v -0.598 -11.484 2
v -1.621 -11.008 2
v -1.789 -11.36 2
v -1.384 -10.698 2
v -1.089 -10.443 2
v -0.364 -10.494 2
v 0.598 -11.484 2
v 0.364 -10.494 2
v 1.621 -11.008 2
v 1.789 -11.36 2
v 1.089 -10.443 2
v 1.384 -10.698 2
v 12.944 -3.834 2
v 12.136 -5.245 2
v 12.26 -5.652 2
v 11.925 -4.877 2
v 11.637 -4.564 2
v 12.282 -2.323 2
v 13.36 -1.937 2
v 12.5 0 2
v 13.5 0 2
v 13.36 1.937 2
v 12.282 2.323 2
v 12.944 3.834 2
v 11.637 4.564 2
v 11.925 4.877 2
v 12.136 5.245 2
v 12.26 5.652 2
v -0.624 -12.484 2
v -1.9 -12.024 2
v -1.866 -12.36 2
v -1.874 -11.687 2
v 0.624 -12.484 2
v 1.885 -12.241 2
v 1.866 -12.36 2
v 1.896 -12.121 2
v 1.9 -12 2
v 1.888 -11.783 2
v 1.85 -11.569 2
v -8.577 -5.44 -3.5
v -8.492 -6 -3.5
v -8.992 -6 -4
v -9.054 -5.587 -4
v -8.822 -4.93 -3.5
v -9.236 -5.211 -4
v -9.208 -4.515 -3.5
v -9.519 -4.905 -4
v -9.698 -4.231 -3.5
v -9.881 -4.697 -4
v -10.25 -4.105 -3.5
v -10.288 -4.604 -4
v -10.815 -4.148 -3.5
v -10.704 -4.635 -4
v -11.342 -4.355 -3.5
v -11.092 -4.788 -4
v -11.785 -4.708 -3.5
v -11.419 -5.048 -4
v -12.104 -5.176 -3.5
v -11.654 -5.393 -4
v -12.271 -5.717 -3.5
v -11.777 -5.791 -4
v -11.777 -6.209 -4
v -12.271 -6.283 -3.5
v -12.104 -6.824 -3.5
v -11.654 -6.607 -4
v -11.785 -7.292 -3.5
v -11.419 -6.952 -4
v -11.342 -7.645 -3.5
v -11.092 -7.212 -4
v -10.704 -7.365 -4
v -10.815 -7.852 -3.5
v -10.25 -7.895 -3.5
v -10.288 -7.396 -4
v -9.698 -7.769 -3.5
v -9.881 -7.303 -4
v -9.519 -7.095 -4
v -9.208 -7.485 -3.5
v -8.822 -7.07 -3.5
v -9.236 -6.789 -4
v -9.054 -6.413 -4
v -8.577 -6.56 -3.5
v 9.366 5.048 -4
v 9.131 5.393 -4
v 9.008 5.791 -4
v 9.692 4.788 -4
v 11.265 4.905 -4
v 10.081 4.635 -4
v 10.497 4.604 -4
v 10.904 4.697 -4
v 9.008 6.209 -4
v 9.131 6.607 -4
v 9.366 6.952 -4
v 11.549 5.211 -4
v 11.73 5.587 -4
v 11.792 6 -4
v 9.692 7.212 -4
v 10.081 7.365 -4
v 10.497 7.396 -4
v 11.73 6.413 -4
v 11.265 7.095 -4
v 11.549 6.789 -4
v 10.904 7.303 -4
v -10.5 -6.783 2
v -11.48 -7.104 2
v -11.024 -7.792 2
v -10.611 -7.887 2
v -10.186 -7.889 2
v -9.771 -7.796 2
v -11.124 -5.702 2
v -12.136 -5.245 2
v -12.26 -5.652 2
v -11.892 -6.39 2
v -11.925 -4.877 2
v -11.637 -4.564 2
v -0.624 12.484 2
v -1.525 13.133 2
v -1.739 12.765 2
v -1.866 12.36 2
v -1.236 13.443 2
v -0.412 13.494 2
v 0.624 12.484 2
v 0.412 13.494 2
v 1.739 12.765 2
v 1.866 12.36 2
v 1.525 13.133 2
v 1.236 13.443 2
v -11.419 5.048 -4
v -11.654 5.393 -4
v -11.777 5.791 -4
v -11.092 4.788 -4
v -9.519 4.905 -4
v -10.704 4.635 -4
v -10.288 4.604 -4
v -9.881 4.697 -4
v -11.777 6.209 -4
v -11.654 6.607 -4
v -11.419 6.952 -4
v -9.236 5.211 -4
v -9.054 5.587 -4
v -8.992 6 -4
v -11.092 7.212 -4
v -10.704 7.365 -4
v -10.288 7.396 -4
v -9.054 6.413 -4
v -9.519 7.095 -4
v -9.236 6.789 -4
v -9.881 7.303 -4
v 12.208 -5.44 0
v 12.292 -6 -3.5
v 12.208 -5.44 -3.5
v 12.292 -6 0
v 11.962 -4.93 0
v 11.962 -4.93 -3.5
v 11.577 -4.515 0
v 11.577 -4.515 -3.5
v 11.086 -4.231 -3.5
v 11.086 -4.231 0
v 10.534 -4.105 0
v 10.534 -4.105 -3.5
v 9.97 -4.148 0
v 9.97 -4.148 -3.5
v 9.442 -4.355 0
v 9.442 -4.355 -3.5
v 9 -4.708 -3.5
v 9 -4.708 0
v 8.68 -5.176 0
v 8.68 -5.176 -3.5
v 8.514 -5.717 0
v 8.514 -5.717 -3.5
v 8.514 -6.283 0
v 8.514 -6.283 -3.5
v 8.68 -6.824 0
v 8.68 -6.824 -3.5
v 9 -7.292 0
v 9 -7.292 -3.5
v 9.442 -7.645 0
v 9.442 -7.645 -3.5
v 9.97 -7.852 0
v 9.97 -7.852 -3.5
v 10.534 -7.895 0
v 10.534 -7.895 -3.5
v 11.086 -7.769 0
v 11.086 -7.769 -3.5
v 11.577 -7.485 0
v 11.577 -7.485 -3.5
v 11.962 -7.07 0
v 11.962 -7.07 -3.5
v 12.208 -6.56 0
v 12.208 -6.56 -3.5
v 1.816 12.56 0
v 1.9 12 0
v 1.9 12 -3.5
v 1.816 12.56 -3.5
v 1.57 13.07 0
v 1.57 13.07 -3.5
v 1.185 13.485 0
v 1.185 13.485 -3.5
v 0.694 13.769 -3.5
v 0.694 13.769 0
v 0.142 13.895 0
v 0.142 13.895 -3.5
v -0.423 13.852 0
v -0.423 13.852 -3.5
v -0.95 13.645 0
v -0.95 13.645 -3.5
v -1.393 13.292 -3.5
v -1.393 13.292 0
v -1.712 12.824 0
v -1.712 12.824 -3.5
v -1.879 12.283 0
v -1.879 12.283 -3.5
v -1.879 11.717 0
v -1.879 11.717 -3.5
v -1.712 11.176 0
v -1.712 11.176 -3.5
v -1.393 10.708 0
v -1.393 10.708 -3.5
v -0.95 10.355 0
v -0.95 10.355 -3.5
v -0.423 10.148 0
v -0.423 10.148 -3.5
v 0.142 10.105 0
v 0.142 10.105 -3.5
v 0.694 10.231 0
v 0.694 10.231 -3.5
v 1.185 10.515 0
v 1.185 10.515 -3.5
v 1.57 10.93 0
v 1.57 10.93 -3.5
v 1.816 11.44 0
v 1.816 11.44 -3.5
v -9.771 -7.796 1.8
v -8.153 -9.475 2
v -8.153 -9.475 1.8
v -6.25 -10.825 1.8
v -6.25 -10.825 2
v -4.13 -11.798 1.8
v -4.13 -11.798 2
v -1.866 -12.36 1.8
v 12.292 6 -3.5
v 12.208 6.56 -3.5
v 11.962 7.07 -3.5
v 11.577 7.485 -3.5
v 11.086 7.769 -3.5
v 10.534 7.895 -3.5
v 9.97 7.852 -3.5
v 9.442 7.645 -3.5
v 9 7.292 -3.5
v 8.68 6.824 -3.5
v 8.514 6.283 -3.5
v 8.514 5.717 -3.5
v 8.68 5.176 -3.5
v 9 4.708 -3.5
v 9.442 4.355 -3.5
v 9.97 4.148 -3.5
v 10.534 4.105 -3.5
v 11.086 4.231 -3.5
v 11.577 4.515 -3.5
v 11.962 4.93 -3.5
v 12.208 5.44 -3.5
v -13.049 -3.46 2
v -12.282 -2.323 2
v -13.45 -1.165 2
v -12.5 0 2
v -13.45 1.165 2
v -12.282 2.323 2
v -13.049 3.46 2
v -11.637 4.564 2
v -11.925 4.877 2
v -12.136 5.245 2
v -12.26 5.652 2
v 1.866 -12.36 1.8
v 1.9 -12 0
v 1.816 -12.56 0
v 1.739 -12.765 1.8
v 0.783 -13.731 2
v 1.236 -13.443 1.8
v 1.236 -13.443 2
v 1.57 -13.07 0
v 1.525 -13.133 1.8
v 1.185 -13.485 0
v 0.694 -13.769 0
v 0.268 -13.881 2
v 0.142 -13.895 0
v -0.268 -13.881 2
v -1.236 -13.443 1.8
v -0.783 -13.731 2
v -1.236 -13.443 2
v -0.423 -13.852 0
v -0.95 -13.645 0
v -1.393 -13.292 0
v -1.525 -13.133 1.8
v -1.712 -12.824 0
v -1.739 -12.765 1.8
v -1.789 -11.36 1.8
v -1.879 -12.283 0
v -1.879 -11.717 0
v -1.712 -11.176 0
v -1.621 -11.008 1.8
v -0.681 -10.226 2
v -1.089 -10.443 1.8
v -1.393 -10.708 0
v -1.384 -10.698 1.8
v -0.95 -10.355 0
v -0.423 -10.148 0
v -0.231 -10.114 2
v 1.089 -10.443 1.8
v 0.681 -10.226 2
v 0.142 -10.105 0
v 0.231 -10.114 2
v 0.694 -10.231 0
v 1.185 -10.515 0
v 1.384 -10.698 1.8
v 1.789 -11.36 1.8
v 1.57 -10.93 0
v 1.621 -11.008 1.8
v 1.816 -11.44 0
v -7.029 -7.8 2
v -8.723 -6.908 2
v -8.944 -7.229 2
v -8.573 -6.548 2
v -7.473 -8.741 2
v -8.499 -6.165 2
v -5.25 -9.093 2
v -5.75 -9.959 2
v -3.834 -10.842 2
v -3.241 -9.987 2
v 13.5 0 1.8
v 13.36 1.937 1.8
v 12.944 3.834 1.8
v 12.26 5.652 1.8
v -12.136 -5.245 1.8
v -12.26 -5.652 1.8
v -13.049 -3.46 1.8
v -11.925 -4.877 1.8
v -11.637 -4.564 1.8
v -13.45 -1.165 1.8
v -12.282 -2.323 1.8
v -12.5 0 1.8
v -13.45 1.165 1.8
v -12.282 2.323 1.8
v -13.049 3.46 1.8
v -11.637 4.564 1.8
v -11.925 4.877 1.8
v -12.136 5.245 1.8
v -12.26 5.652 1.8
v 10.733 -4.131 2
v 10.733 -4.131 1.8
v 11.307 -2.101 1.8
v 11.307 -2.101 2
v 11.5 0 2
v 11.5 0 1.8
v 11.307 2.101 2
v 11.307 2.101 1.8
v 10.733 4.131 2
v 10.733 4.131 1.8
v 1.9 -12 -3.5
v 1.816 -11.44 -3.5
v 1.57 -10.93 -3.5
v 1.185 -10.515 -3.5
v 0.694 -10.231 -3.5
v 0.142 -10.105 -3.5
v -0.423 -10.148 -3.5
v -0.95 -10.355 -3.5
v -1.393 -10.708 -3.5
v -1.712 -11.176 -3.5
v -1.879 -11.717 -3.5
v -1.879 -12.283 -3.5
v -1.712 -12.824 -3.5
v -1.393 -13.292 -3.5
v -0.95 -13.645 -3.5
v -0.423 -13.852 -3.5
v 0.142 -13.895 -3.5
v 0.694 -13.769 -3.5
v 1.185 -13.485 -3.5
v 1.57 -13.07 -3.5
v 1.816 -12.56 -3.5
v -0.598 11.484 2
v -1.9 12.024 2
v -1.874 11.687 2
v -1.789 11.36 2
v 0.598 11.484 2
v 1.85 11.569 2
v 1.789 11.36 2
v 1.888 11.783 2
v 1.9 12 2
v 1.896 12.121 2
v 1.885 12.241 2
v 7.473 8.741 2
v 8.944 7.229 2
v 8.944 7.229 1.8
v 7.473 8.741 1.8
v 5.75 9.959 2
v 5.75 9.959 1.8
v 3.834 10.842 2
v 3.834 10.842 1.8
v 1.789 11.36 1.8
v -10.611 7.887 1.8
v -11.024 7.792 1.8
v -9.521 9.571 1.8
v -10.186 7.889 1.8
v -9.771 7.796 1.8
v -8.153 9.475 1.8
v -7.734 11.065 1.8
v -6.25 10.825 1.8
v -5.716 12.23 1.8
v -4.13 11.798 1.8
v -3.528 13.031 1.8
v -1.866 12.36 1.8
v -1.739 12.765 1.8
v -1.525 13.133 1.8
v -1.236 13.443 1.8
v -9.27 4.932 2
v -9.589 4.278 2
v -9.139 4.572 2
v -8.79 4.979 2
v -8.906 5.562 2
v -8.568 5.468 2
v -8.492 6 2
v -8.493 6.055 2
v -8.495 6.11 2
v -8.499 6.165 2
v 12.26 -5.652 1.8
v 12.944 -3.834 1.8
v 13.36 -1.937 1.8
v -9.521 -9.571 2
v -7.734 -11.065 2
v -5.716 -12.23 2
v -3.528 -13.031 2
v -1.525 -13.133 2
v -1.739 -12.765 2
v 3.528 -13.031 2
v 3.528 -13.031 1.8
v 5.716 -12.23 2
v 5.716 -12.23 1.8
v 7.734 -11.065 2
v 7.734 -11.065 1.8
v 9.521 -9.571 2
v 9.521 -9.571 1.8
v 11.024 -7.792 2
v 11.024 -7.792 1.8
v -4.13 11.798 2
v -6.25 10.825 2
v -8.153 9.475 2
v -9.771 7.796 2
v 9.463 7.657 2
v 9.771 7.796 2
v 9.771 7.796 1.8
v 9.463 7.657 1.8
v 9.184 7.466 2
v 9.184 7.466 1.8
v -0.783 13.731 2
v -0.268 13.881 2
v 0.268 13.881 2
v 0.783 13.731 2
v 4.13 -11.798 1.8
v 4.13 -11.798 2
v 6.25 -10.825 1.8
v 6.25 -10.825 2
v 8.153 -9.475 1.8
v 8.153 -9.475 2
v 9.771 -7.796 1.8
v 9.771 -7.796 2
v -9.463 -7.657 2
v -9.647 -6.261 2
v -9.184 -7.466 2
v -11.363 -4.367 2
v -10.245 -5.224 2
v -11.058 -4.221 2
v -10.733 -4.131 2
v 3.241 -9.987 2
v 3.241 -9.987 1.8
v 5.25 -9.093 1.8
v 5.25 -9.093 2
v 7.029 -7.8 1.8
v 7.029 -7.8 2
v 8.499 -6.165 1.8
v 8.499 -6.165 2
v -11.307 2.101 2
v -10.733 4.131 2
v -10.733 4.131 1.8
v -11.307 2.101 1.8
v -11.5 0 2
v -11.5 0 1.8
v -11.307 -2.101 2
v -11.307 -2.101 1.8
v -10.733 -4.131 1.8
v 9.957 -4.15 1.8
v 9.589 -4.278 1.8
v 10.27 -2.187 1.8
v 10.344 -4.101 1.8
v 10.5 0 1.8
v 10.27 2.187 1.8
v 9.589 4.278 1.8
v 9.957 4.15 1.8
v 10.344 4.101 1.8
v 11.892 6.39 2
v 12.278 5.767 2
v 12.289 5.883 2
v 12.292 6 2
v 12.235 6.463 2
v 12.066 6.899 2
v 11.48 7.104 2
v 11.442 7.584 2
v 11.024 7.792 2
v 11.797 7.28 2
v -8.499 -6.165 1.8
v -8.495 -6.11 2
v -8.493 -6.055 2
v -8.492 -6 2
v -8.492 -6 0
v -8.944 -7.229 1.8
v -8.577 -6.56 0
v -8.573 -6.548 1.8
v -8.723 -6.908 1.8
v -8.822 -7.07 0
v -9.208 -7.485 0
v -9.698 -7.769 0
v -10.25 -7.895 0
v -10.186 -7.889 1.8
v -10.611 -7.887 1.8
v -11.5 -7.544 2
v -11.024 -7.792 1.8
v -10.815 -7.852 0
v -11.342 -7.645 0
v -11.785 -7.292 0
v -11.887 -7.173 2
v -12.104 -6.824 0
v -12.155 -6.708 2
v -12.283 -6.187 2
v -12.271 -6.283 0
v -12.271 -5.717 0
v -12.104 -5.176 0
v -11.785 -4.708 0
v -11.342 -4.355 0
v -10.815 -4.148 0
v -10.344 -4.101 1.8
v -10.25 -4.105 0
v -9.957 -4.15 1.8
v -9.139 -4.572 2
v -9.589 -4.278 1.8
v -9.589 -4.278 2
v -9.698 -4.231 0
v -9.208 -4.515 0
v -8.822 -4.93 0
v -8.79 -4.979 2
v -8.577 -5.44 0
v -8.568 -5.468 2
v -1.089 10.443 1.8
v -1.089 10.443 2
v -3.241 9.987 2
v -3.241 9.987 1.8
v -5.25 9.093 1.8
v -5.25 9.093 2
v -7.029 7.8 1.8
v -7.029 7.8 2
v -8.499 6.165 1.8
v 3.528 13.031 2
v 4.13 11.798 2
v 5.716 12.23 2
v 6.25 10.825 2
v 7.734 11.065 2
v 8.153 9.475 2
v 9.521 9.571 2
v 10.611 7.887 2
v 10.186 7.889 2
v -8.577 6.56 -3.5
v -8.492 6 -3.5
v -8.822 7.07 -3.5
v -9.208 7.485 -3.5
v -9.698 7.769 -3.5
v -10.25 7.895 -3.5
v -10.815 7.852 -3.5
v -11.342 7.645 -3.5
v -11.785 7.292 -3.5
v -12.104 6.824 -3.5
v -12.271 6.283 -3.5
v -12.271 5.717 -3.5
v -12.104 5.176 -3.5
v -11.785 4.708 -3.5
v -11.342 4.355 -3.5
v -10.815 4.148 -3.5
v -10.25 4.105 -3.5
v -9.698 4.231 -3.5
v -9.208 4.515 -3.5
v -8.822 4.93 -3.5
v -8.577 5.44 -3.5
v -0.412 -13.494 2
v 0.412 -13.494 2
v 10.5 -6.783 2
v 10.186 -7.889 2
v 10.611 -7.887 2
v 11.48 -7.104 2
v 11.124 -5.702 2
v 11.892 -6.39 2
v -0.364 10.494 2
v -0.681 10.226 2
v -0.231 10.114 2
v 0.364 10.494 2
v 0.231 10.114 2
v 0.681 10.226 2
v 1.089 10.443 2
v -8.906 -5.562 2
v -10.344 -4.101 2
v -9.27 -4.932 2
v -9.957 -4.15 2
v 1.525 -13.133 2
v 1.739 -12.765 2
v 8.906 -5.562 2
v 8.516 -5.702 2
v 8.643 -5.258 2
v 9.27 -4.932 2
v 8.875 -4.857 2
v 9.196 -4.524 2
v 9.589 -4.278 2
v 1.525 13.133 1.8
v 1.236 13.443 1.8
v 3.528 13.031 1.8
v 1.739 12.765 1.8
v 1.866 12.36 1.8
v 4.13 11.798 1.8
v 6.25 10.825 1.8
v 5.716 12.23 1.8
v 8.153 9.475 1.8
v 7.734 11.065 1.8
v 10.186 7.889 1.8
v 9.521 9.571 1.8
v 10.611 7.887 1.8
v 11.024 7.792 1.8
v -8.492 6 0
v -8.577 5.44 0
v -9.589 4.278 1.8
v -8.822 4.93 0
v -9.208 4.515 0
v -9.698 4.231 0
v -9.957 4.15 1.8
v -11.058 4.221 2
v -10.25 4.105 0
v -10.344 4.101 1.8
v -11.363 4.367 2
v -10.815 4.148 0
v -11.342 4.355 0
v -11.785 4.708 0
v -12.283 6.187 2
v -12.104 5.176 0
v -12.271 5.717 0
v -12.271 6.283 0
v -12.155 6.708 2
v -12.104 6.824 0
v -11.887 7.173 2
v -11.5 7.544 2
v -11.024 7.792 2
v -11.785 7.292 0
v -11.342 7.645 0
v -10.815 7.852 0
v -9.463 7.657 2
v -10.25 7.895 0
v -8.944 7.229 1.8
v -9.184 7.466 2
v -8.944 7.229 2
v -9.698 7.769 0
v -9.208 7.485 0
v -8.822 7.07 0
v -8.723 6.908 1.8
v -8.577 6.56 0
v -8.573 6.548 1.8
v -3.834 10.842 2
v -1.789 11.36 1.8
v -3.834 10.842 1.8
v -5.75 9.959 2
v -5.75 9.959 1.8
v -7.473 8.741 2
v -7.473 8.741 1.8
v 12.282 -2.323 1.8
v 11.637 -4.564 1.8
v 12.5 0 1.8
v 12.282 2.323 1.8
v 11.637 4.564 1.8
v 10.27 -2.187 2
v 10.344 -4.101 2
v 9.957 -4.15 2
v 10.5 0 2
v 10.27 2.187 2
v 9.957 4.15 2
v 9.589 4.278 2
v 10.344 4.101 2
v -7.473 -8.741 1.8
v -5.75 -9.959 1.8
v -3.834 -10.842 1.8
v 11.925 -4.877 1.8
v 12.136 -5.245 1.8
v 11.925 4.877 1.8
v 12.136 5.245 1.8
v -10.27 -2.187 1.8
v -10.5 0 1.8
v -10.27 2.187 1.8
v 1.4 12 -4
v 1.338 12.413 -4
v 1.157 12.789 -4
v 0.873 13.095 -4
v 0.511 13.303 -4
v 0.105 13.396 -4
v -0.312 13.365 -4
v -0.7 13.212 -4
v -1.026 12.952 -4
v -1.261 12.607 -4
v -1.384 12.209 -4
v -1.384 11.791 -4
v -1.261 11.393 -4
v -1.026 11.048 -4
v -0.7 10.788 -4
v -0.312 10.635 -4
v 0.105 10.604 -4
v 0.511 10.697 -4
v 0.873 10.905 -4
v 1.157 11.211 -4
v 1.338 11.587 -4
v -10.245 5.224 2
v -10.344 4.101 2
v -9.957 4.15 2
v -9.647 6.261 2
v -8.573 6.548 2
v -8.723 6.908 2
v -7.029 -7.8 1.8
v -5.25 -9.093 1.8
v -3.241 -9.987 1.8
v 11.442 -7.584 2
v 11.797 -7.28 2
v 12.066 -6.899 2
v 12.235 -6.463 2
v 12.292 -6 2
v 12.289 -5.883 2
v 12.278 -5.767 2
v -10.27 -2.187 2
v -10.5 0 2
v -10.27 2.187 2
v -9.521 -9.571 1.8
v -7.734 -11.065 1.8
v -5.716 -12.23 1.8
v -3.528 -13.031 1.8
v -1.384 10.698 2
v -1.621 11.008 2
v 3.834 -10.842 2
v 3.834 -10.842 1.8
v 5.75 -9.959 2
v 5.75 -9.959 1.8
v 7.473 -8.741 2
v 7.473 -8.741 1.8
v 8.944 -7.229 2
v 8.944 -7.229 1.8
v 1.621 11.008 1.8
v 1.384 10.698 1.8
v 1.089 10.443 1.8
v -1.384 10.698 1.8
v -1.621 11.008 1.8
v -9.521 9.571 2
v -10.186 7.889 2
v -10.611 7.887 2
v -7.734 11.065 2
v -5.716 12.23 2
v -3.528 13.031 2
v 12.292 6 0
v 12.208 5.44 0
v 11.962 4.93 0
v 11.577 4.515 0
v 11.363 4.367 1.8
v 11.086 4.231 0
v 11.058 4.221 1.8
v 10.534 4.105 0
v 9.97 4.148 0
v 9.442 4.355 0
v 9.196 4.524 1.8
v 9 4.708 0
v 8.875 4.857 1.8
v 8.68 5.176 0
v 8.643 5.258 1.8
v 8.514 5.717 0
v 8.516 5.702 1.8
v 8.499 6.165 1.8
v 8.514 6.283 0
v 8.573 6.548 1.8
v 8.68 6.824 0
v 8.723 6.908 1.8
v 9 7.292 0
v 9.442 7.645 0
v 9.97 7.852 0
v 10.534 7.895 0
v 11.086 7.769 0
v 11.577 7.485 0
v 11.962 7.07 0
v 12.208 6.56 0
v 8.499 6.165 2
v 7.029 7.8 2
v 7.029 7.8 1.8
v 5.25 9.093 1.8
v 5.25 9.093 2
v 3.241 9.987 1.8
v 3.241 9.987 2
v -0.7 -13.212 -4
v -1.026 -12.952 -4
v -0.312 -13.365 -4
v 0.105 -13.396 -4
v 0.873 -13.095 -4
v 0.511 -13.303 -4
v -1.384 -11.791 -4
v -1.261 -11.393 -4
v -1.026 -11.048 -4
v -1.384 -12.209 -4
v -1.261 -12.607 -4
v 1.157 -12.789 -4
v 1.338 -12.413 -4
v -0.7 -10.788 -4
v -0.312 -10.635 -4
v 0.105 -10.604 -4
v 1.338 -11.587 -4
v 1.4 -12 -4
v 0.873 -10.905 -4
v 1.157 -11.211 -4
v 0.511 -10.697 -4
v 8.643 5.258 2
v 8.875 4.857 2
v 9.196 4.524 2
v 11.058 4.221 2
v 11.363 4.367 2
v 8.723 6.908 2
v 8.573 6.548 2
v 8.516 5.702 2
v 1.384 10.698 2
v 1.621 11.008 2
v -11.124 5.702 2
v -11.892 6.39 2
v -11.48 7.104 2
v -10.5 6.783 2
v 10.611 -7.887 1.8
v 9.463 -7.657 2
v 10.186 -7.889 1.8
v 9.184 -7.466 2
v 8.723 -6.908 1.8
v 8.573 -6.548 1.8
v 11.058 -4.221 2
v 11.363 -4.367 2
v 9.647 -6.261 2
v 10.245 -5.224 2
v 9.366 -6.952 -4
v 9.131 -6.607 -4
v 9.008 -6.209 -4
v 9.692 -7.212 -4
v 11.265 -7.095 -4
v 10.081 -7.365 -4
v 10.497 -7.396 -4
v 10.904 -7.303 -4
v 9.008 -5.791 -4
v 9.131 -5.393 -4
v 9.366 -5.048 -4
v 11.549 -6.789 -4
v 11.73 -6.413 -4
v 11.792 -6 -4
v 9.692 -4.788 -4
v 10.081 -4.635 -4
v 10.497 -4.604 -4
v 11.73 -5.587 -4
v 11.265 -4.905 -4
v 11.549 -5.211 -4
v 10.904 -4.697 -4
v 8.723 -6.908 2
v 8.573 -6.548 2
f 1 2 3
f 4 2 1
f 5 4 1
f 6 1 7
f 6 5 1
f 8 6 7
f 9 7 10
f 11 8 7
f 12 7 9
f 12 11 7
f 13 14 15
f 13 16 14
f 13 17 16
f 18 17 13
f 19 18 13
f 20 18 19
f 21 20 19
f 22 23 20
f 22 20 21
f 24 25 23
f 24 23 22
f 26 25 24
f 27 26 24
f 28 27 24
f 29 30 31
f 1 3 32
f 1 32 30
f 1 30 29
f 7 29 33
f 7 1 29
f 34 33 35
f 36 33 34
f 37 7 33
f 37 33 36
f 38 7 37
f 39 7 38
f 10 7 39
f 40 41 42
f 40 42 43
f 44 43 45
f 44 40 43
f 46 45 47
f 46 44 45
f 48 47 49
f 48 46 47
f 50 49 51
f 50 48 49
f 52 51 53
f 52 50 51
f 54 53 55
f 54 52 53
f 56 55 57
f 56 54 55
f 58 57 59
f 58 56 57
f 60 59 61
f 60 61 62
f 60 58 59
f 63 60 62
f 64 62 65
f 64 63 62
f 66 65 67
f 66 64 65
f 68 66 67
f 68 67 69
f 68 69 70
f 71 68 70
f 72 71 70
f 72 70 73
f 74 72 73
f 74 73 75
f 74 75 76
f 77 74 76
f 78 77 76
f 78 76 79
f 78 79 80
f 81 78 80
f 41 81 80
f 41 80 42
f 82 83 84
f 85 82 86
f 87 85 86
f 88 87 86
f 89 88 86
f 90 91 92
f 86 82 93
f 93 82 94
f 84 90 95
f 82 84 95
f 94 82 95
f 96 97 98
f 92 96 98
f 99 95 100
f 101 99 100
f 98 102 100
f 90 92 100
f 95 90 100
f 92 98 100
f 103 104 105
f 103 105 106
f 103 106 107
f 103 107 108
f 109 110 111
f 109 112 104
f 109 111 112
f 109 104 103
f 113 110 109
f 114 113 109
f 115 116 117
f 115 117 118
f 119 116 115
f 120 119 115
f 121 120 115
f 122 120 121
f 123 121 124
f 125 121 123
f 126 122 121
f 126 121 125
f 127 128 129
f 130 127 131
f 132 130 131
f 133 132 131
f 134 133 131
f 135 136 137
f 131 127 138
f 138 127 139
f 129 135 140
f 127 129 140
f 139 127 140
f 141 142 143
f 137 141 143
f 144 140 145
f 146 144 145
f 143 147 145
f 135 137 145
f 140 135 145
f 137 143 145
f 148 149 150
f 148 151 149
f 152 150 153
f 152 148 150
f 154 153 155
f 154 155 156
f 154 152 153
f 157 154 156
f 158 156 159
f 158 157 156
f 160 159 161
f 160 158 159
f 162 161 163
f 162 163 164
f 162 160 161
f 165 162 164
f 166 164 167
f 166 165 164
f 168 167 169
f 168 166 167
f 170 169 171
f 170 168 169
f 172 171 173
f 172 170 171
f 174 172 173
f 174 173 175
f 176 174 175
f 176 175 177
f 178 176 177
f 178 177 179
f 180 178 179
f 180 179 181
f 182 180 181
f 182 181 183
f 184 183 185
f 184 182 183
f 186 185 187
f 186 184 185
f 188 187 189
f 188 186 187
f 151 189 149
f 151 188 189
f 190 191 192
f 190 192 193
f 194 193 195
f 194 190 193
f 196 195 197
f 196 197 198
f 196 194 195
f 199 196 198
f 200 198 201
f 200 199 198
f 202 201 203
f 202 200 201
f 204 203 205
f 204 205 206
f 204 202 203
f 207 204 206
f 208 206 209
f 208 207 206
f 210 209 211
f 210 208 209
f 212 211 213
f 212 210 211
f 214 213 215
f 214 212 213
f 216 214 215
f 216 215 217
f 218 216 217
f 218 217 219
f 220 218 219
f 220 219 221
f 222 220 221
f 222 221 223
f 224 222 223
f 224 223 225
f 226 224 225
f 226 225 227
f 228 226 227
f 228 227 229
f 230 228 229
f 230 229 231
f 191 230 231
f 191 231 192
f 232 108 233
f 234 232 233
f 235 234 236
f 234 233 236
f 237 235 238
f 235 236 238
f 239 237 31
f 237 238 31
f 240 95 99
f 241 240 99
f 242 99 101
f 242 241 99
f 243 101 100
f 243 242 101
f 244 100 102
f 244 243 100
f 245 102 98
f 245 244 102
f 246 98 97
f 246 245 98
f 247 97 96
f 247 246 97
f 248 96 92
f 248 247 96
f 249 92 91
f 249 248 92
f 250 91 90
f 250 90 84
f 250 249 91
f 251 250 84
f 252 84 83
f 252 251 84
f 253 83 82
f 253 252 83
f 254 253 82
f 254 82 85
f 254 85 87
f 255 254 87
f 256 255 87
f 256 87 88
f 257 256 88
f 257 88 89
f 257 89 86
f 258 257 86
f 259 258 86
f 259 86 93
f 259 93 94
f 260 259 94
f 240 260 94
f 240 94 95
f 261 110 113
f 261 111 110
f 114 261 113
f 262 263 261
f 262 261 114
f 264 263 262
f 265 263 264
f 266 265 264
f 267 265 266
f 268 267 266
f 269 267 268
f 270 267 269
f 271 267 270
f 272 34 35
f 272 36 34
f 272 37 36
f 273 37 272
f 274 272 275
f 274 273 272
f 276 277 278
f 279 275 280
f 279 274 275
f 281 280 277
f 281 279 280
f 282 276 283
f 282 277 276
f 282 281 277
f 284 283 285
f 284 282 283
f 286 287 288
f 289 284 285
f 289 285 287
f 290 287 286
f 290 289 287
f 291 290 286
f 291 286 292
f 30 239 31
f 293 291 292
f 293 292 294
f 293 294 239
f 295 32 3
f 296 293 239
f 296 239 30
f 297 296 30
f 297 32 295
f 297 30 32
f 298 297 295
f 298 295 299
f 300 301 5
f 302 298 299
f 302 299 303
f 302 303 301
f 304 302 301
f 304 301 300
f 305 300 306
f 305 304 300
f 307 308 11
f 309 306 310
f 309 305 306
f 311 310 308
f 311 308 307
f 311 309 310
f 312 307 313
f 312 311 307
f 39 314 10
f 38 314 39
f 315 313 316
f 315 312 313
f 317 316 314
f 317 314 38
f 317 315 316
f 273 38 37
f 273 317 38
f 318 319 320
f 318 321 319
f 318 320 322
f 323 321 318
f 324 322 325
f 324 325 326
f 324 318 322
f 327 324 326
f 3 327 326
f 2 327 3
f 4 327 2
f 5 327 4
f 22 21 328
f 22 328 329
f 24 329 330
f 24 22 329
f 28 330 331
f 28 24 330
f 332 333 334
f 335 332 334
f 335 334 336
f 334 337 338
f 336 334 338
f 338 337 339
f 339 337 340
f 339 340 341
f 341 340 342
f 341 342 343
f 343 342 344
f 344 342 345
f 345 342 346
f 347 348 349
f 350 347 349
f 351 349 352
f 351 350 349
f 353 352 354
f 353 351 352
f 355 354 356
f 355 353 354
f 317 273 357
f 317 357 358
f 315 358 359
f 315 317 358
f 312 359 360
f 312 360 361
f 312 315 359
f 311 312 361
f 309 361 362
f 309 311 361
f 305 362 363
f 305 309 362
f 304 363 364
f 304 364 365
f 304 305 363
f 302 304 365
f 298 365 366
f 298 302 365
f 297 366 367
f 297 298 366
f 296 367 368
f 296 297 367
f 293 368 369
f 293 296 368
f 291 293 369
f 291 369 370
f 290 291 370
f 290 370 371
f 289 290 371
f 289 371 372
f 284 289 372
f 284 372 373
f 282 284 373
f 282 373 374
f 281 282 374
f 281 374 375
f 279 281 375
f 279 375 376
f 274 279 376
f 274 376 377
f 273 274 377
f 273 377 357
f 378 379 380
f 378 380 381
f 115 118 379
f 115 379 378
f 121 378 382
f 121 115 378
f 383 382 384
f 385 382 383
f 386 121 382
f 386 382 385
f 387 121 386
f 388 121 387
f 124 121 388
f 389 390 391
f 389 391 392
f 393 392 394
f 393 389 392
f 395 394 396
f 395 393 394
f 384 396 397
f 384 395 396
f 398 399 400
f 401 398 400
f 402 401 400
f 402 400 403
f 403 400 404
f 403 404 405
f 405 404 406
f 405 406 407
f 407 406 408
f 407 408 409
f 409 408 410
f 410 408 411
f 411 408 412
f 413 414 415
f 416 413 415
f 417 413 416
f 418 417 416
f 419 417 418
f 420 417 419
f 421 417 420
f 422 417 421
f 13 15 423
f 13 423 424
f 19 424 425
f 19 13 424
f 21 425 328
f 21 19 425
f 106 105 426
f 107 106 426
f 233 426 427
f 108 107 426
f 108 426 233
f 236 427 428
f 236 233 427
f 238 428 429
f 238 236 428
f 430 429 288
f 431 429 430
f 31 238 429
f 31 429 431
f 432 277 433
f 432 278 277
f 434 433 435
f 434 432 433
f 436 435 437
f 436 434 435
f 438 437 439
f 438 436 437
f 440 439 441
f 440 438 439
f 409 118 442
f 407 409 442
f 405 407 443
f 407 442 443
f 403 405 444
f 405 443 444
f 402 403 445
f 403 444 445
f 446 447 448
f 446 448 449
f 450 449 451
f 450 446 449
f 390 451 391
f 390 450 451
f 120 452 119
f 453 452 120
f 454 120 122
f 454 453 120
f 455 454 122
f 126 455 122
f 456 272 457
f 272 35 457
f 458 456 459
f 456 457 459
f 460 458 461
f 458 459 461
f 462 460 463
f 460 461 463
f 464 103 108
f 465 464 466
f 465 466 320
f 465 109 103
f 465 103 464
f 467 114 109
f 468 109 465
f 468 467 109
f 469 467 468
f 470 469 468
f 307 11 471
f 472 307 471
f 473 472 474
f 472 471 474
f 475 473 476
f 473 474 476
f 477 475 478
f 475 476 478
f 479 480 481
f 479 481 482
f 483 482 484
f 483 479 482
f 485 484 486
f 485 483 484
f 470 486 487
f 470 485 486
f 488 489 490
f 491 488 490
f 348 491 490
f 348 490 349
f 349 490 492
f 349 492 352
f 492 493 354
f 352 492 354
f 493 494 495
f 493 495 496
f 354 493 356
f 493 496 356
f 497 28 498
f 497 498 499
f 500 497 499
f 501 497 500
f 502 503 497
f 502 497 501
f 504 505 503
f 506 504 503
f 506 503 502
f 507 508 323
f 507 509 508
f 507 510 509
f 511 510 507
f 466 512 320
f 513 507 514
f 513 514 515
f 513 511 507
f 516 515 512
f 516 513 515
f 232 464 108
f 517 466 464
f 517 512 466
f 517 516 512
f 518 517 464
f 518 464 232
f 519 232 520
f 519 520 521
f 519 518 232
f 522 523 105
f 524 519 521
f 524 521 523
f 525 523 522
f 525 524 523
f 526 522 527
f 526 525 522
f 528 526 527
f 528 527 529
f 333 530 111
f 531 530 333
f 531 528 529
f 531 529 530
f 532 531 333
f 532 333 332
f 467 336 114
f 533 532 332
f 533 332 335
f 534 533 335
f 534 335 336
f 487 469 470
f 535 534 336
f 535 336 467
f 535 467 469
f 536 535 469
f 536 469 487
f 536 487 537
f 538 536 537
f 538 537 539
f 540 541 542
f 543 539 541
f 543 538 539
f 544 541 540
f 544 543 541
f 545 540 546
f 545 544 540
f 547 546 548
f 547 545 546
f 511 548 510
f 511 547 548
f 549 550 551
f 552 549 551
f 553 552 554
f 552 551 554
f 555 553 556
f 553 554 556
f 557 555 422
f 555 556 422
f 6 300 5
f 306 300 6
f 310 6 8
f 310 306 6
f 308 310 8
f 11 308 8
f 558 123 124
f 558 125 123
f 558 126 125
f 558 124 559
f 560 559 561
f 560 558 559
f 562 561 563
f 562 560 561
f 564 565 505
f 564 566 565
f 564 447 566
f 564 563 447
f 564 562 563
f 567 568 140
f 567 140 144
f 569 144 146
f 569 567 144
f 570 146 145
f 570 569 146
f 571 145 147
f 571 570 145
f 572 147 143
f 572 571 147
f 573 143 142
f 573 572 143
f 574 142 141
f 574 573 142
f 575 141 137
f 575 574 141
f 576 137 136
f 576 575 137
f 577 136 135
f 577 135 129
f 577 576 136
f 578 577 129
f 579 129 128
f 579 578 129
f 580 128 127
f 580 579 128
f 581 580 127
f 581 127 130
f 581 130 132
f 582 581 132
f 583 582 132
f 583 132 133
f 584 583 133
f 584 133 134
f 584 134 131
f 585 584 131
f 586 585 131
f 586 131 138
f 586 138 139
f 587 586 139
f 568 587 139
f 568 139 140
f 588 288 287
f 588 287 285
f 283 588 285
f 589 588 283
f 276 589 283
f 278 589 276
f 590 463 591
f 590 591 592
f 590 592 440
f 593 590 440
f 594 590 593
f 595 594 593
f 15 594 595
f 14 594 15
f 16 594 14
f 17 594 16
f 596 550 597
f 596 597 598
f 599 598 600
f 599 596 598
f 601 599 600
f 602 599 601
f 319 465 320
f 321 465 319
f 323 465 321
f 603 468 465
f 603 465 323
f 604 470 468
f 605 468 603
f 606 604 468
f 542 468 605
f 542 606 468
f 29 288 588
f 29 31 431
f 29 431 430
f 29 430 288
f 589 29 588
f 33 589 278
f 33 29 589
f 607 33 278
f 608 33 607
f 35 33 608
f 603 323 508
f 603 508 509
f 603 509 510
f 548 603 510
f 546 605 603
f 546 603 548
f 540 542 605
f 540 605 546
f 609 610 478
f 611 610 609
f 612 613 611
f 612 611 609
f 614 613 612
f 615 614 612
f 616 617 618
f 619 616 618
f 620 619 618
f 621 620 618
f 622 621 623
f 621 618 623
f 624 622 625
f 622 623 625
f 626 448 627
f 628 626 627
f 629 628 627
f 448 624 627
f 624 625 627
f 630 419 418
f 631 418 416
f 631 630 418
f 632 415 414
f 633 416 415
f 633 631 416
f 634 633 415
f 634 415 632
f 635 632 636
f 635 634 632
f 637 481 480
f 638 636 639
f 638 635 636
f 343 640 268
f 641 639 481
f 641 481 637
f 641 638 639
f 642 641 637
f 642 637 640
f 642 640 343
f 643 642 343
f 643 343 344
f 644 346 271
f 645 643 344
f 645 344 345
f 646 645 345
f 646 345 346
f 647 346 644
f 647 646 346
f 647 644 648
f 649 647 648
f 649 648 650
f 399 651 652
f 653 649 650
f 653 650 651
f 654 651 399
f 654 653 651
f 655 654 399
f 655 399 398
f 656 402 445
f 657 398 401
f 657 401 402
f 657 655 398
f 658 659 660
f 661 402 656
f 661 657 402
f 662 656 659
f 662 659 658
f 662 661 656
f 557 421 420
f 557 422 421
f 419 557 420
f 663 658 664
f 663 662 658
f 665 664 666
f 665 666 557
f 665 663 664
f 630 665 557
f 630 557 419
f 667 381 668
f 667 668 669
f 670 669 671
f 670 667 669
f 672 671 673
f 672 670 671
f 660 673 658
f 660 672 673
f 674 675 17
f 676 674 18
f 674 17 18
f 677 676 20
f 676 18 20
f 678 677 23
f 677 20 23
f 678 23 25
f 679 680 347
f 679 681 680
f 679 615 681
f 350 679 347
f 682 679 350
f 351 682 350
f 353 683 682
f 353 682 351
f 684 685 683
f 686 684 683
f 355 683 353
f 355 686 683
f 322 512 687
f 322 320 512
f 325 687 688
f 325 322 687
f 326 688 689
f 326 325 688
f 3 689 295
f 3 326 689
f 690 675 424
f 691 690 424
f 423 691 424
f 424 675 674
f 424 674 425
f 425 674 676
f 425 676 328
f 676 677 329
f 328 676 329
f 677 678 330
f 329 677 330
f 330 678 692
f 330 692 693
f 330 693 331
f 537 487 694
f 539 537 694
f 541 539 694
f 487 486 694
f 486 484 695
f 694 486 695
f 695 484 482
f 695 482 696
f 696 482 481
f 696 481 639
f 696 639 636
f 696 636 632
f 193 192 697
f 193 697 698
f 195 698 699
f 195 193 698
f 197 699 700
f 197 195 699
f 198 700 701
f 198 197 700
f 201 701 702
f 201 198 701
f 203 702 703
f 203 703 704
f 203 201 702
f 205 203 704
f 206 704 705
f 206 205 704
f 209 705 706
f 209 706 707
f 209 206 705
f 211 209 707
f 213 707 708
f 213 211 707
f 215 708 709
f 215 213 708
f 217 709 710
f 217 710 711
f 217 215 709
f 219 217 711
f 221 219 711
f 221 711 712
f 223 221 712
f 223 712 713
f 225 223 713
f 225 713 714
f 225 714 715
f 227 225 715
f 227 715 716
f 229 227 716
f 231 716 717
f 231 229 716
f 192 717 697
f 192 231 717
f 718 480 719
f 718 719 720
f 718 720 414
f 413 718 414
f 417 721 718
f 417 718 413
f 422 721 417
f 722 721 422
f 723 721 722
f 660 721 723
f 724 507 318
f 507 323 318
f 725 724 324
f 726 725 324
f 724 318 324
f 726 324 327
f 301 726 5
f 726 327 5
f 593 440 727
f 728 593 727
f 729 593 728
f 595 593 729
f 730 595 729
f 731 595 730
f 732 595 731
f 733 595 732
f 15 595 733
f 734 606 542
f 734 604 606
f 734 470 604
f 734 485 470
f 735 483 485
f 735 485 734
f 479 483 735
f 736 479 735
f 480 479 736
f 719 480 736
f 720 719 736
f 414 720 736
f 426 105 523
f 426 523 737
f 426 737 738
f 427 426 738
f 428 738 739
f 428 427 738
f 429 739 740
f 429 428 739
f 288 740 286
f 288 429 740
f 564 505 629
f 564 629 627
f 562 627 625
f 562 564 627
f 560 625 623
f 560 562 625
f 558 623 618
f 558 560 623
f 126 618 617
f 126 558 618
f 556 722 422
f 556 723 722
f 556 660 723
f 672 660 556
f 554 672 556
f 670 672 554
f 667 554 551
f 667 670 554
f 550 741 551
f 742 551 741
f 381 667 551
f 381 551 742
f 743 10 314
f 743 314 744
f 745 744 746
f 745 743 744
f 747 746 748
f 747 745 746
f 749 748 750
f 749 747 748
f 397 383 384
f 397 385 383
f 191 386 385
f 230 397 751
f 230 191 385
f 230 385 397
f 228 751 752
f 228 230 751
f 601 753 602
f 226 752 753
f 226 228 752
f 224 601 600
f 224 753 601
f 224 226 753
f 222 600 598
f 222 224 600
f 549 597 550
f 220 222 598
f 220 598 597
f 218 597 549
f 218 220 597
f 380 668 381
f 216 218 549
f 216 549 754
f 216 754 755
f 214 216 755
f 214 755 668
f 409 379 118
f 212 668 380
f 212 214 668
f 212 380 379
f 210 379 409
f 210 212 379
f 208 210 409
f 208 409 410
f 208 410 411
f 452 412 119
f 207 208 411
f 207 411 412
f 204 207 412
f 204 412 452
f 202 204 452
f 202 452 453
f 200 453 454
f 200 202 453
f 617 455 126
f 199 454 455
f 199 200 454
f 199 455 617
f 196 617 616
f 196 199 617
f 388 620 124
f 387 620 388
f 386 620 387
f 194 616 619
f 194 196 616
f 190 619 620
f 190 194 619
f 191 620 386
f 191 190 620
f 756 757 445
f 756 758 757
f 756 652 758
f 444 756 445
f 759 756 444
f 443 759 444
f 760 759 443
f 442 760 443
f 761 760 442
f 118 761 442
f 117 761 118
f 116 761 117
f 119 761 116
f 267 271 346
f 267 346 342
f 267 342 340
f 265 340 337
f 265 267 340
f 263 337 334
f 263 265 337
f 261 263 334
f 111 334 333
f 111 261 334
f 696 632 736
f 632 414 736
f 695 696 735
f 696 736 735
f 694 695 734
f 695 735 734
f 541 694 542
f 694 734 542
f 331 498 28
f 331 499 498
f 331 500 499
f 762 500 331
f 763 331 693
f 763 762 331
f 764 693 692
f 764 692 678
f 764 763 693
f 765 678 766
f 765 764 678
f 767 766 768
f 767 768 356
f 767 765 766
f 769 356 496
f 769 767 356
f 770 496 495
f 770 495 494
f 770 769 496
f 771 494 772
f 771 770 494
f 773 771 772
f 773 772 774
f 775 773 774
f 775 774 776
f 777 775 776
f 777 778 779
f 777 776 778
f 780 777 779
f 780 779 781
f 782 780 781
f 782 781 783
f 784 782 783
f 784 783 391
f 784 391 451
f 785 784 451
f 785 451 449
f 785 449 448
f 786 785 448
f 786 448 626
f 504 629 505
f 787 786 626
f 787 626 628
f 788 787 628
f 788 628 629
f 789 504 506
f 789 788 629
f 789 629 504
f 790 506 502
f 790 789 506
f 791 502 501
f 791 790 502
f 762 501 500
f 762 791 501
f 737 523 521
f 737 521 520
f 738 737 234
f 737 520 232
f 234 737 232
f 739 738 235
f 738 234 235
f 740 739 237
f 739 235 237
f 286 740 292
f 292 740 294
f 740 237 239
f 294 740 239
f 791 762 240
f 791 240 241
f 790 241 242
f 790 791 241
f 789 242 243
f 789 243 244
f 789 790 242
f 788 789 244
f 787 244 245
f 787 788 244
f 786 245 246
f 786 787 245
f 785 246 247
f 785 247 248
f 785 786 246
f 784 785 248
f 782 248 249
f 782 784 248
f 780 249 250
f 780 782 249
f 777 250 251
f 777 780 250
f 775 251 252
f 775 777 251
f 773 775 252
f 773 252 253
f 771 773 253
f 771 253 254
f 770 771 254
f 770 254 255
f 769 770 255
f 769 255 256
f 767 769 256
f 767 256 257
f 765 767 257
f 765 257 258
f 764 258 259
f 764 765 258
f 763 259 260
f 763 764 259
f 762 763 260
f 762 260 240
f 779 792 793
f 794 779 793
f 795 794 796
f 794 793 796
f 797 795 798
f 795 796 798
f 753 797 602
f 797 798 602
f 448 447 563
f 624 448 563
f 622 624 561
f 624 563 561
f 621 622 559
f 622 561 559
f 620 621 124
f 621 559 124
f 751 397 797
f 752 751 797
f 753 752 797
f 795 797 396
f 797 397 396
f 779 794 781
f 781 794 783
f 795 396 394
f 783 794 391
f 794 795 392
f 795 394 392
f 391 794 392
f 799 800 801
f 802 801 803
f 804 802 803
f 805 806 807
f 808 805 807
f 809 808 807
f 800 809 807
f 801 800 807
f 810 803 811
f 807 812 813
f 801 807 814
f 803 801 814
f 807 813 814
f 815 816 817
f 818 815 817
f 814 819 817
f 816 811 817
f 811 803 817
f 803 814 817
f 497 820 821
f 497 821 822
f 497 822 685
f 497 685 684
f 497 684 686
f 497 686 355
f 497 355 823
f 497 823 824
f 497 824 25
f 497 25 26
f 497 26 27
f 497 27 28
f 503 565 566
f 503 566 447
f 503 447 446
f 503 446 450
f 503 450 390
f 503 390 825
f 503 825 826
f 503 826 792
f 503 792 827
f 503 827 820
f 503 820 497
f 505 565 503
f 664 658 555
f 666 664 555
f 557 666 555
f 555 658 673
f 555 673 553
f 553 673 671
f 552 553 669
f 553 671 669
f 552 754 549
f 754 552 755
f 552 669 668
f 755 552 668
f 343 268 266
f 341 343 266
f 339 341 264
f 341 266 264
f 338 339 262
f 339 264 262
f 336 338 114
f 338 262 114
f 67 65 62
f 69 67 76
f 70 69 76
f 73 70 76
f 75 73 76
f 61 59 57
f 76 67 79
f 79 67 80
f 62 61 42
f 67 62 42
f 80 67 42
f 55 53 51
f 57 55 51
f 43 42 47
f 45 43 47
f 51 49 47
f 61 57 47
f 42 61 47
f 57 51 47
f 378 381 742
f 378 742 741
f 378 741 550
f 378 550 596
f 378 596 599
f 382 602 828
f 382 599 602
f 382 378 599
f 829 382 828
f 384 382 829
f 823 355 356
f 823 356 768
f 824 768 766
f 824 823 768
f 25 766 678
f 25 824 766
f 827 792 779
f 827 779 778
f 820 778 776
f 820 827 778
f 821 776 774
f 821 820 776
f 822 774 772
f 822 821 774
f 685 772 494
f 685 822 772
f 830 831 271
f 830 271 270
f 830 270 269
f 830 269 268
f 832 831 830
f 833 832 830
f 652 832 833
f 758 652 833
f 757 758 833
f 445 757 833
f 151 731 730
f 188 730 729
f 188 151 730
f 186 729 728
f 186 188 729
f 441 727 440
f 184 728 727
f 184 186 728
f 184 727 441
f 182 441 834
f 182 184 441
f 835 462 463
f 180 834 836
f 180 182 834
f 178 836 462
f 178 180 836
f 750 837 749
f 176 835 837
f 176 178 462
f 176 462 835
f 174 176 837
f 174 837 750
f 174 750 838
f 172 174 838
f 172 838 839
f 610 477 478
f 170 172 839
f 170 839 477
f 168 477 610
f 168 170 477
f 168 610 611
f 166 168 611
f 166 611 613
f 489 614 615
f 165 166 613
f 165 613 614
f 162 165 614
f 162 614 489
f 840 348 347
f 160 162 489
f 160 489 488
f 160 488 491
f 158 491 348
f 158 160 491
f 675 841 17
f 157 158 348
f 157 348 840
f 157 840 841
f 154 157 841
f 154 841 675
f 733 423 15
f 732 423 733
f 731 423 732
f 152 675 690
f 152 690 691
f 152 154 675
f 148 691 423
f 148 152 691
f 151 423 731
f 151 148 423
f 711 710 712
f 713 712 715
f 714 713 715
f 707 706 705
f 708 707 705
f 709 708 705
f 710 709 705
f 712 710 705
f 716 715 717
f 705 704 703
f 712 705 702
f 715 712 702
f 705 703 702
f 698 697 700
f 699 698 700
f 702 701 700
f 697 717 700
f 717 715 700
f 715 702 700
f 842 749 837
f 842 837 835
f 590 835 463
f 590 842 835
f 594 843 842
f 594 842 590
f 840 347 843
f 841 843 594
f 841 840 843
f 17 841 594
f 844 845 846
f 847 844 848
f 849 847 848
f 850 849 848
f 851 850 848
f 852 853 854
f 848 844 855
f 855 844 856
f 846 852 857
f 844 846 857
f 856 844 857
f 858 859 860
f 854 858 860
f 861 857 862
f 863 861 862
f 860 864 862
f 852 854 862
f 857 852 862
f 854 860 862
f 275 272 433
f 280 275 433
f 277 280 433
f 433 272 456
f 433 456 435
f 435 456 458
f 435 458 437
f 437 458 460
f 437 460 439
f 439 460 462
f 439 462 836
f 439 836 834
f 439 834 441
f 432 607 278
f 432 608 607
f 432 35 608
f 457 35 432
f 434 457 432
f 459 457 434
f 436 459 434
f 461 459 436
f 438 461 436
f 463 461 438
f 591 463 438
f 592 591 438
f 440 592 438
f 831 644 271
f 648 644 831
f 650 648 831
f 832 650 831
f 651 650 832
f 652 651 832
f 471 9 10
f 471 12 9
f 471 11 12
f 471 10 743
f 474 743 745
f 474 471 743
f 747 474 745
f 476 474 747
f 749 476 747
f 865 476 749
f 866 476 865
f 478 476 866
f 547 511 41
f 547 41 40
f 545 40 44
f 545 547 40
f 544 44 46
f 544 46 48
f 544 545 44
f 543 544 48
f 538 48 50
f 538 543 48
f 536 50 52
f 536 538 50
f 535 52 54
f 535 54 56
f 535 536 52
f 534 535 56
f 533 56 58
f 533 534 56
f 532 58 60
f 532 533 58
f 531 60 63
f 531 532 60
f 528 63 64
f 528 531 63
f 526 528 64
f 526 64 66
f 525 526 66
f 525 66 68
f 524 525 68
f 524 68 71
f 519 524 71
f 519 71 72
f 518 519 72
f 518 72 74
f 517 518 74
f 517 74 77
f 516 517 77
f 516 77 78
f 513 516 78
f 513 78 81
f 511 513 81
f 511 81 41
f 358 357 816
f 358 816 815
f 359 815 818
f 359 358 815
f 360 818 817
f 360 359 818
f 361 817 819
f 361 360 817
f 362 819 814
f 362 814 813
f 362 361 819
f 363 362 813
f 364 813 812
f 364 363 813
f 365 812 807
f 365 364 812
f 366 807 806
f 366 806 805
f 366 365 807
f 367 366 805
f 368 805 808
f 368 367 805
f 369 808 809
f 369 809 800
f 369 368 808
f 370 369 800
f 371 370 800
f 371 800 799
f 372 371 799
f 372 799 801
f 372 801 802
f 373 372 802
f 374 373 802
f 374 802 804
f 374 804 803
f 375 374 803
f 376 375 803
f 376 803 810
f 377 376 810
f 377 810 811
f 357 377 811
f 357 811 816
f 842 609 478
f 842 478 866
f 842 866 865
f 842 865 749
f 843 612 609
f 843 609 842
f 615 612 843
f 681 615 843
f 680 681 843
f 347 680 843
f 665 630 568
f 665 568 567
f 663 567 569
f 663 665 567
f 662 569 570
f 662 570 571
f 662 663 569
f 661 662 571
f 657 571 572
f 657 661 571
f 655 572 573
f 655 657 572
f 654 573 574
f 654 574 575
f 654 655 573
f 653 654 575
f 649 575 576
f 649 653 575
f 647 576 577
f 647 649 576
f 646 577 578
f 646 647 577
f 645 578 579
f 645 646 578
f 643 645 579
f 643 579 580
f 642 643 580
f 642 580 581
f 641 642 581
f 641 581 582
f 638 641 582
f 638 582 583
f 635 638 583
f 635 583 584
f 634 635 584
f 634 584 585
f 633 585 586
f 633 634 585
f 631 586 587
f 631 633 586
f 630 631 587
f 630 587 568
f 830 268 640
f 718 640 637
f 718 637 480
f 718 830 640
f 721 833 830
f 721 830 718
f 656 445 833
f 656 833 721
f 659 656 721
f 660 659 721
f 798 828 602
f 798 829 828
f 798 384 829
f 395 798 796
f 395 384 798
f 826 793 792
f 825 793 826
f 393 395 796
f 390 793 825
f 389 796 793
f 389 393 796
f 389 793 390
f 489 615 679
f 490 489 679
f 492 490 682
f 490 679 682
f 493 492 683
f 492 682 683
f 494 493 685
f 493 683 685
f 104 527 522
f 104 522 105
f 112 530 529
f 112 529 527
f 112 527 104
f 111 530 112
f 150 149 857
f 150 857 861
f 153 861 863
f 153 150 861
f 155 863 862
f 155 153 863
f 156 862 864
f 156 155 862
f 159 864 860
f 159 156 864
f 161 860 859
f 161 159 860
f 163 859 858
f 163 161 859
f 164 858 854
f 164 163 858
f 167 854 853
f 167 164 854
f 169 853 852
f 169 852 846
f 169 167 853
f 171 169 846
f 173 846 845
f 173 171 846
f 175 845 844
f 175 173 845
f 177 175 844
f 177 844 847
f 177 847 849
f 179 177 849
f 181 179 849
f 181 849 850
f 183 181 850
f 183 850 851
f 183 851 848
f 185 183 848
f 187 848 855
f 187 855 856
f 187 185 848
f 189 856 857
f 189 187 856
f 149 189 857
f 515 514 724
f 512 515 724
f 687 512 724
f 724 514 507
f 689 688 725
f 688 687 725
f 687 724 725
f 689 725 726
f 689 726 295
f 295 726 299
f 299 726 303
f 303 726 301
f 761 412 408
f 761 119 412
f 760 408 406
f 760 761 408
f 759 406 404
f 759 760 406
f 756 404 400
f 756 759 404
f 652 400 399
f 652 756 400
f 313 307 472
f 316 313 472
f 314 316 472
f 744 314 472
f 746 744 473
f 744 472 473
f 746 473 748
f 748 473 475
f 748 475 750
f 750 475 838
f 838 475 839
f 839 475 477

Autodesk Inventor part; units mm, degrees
ref_plane "YZ Plane" through (0, 0, 0) normal (1, 0, 0) x (0, 1, 0)
ref_plane "XZ Plane" through (0, 0, 0) normal (0, 1, 0) x (-1, 0, 0)
ref_plane "XY Plane" through (0, 0, 0) normal (0, 0, 1) x (1, 0, 0)
sketch "Эскиз1" plane through (0, 0, 0) normal (0, 0, 1) x (1, 0, 0)
  circle A0 centre (10.3923, 6) radius 2 projected
  circle A1 centre (10.3923, -6) radius 2 projected
  circle A2 centre (0, -12) radius 2 projected
  circle A3 centre (-10.3923, -6) radius 2 projected
  circle A4 centre (0, 0) radius 4 projected
  arc A5 (4.659, 13.202) -> (0, 14) centre (0, 0) ccw projected
  circle A6 centre (0, 12) radius 2 projected
  arc A7 (0, 14) -> (-4.659, 13.202) centre (0, 0) ccw projected
  arc A8 (-3.5064, 12.0732) -> (-4.659, 13.202) centre (-6.1045, 10.5732) ccw projected
  line L0 (-3.5064, 12.0732) -> (-2.63, 7.3847) projected
  arc A9 (-5.0804, 5.97) -> (-2.63, 7.3847) centre (-4.1045, 7.1091) ccw projected
  line L1 (-5.0804, 5.97) -> (-8.7025, 9.0732) projected
  arc A10 (-9.1038, 10.6358) -> (-8.7025, 9.0732) centre (-6.1045, 10.5732) ccw projected
  arc A11 (-9.1038, 10.6358) -> (-12.1244, 7) centre (0, 0) ccw projected
  circle A12 centre (-10.3923, 6) radius 2 projected
  arc A13 (-12.1244, 7) -> (-13.7628, 2.5662) centre (0, 0) ccw projected
  arc A14 (-12.2089, 3) -> (-13.7628, 2.5662) centre (-12.2089, 0) ccw projected
  line L2 (-12.2089, 3) -> (-7.7104, 1.4147) projected
  arc A15 (-7.7104, -1.4147) -> (-7.7104, 1.4147) centre (-8.2089, 0) ccw projected
  line L3 (-7.7104, -1.4147) -> (-12.2089, -3) projected
  arc A16 (-13.7628, -2.5662) -> (-12.2089, -3) centre (-12.2089, 0) ccw projected
  arc A17 (-13.7628, -2.5662) -> (-12.1244, -7) centre (0, 0) ccw projected
  circle A18 centre (-10.3923, -6) radius 2 projected
  arc A19 (-12.1244, -7) -> (-9.1038, -10.6358) centre (0, 0) ccw projected
  arc A20 (-8.7025, -9.0732) -> (-9.1038, -10.6358) centre (-6.1045, -10.5732) ccw projected
  line L4 (-8.7025, -9.0732) -> (-5.0804, -5.97) projected
  arc A21 (-2.63, -7.3847) -> (-5.0804, -5.97) centre (-4.1045, -7.1091) ccw projected
  line L5 (-2.63, -7.3847) -> (-3.5064, -12.0732) projected
  arc A22 (-4.659, -13.202) -> (-3.5064, -12.0732) centre (-6.1045, -10.5732) ccw projected
  arc A23 (-4.659, -13.202) -> (0, -14) centre (0, 0) ccw projected
  circle A24 centre (0, -12) radius 2 projected
  arc A25 (0, -14) -> (4.659, -13.202) centre (0, 0) ccw projected
  arc A26 (3.5064, -12.0732) -> (4.659, -13.202) centre (6.1045, -10.5732) ccw projected
  line L6 (3.5064, -12.0732) -> (2.63, -7.3847) projected
  arc A27 (5.0804, -5.97) -> (2.63, -7.3847) centre (4.1045, -7.1091) ccw projected
  line L7 (5.0804, -5.97) -> (8.7025, -9.0732) projected
  arc A28 (9.1038, -10.6358) -> (8.7025, -9.0732) centre (6.1045, -10.5732) ccw projected
  arc A29 (9.1038, -10.6358) -> (12.1244, -7) centre (0, 0) ccw projected
  circle A30 centre (10.3923, -6) radius 2 projected
  arc A31 (12.1244, -7) -> (13.7628, -2.5662) centre (0, 0) ccw projected
  arc A32 (12.2089, -3) -> (13.7628, -2.5662) centre (12.2089, 0) ccw projected
  line L8 (12.2089, -3) -> (7.7104, -1.4147) projected
  arc A33 (7.7104, 1.4147) -> (7.7104, -1.4147) centre (8.2089, 0) ccw projected
  line L9 (7.7104, 1.4147) -> (12.2089, 3) projected
  arc A34 (13.7628, 2.5662) -> (12.2089, 3) centre (12.2089, 0) ccw projected
  arc A35 (13.7628, 2.5662) -> (12.1244, 7) centre (0, 0) ccw projected
  circle A36 centre (10.3923, 6) radius 2 projected
  arc A37 (12.1244, 7) -> (9.1038, 10.6358) centre (0, 0) ccw projected
  arc A38 (8.7025, 9.0732) -> (9.1038, 10.6358) centre (6.1045, 10.5732) ccw projected
  line L10 (8.7025, 9.0732) -> (5.0804, 5.97) projected
  arc A39 (2.63, 7.3847) -> (5.0804, 5.97) centre (4.1045, 7.1091) ccw projected
  line L11 (2.63, 7.3847) -> (3.5064, 12.0732) projected
  arc A40 (4.659, 13.202) -> (3.5064, 12.0732) centre (6.1045, 10.5732) ccw projected
  circle A41 centre (10.3923, 6) radius 1.9
  circle A42 centre (0, 12) radius 1.9
  circle A43 centre (-10.3923, 6) radius 1.9
  circle A44 centre (-10.3923, -6) radius 1.9
  circle A45 centre (0, -12) radius 1.9
  circle A46 centre (10.3923, -6) radius 1.9
  point P0 (0, 0)
  dimension "d0" = 0.1
  dimension "d3" = 360
extrude "Выдавливание1" add sketch "Эскиз1" along normal blind 2 and the other way blind 4 contours A41 | A42 | A43 | A44 | A45 | A46
sketch "Эскиз2" plane through (10.3923, 6, 2) normal (0, 0, 1) x (1, 0, 0)
  circle A0 centre (0, 0) radius 1.9 projected
  circle A1 centre (0, 0) radius 1.9 projected
  circle A2 centre (-10.3923, -6) radius 12
  circle A3 centre (-10.3923, -6) radius 10.5
  circle A4 centre (-10.3923, -6) radius 13.5
  circle A5 centre (-10.3923, -6) radius 12.5
  circle A6 centre (-10.3923, -6) radius 11.5
  point P0 (-0.8034, -1.7218)
  point P1 (-1.8928, 0.1651)
  point P2 (-0.621, 1.7956)
  point P3 (-1.4487, 1.2293)
  point P4 (0.3402, -1.8693)
  point P5 (1.2446, -1.4356)
  dimension "d9" = 1.5
  dimension "d12" = 1.5
  dimension "d13" = 0.5
  dimension "d14" = 0.5
extrude "Выдавливание2" add sketch "Эскиз2" against normal blind 0.2 contours A4 A0 A5 | A0 A5 A4 | A5 A0 A2 | A2 A0 A6 | A6 A0 A3 | A0 A3 A6 | A3 A0 picked at (0.2342, -0.105) picked at (-0.0588, -0.2643) picked at (-1.3755, -0.8832)
chamfer "Фаска1" distance 0.5 angle 45 6 edges at (8.4923, 6, -4) (-1.9, 12, -4) (8.4923, -6, -4) (-1.9, -12, -4) (-12.2923, -6, -4) (-12.2923, 6, -4)
properties part number "СкреплениеКатков"
